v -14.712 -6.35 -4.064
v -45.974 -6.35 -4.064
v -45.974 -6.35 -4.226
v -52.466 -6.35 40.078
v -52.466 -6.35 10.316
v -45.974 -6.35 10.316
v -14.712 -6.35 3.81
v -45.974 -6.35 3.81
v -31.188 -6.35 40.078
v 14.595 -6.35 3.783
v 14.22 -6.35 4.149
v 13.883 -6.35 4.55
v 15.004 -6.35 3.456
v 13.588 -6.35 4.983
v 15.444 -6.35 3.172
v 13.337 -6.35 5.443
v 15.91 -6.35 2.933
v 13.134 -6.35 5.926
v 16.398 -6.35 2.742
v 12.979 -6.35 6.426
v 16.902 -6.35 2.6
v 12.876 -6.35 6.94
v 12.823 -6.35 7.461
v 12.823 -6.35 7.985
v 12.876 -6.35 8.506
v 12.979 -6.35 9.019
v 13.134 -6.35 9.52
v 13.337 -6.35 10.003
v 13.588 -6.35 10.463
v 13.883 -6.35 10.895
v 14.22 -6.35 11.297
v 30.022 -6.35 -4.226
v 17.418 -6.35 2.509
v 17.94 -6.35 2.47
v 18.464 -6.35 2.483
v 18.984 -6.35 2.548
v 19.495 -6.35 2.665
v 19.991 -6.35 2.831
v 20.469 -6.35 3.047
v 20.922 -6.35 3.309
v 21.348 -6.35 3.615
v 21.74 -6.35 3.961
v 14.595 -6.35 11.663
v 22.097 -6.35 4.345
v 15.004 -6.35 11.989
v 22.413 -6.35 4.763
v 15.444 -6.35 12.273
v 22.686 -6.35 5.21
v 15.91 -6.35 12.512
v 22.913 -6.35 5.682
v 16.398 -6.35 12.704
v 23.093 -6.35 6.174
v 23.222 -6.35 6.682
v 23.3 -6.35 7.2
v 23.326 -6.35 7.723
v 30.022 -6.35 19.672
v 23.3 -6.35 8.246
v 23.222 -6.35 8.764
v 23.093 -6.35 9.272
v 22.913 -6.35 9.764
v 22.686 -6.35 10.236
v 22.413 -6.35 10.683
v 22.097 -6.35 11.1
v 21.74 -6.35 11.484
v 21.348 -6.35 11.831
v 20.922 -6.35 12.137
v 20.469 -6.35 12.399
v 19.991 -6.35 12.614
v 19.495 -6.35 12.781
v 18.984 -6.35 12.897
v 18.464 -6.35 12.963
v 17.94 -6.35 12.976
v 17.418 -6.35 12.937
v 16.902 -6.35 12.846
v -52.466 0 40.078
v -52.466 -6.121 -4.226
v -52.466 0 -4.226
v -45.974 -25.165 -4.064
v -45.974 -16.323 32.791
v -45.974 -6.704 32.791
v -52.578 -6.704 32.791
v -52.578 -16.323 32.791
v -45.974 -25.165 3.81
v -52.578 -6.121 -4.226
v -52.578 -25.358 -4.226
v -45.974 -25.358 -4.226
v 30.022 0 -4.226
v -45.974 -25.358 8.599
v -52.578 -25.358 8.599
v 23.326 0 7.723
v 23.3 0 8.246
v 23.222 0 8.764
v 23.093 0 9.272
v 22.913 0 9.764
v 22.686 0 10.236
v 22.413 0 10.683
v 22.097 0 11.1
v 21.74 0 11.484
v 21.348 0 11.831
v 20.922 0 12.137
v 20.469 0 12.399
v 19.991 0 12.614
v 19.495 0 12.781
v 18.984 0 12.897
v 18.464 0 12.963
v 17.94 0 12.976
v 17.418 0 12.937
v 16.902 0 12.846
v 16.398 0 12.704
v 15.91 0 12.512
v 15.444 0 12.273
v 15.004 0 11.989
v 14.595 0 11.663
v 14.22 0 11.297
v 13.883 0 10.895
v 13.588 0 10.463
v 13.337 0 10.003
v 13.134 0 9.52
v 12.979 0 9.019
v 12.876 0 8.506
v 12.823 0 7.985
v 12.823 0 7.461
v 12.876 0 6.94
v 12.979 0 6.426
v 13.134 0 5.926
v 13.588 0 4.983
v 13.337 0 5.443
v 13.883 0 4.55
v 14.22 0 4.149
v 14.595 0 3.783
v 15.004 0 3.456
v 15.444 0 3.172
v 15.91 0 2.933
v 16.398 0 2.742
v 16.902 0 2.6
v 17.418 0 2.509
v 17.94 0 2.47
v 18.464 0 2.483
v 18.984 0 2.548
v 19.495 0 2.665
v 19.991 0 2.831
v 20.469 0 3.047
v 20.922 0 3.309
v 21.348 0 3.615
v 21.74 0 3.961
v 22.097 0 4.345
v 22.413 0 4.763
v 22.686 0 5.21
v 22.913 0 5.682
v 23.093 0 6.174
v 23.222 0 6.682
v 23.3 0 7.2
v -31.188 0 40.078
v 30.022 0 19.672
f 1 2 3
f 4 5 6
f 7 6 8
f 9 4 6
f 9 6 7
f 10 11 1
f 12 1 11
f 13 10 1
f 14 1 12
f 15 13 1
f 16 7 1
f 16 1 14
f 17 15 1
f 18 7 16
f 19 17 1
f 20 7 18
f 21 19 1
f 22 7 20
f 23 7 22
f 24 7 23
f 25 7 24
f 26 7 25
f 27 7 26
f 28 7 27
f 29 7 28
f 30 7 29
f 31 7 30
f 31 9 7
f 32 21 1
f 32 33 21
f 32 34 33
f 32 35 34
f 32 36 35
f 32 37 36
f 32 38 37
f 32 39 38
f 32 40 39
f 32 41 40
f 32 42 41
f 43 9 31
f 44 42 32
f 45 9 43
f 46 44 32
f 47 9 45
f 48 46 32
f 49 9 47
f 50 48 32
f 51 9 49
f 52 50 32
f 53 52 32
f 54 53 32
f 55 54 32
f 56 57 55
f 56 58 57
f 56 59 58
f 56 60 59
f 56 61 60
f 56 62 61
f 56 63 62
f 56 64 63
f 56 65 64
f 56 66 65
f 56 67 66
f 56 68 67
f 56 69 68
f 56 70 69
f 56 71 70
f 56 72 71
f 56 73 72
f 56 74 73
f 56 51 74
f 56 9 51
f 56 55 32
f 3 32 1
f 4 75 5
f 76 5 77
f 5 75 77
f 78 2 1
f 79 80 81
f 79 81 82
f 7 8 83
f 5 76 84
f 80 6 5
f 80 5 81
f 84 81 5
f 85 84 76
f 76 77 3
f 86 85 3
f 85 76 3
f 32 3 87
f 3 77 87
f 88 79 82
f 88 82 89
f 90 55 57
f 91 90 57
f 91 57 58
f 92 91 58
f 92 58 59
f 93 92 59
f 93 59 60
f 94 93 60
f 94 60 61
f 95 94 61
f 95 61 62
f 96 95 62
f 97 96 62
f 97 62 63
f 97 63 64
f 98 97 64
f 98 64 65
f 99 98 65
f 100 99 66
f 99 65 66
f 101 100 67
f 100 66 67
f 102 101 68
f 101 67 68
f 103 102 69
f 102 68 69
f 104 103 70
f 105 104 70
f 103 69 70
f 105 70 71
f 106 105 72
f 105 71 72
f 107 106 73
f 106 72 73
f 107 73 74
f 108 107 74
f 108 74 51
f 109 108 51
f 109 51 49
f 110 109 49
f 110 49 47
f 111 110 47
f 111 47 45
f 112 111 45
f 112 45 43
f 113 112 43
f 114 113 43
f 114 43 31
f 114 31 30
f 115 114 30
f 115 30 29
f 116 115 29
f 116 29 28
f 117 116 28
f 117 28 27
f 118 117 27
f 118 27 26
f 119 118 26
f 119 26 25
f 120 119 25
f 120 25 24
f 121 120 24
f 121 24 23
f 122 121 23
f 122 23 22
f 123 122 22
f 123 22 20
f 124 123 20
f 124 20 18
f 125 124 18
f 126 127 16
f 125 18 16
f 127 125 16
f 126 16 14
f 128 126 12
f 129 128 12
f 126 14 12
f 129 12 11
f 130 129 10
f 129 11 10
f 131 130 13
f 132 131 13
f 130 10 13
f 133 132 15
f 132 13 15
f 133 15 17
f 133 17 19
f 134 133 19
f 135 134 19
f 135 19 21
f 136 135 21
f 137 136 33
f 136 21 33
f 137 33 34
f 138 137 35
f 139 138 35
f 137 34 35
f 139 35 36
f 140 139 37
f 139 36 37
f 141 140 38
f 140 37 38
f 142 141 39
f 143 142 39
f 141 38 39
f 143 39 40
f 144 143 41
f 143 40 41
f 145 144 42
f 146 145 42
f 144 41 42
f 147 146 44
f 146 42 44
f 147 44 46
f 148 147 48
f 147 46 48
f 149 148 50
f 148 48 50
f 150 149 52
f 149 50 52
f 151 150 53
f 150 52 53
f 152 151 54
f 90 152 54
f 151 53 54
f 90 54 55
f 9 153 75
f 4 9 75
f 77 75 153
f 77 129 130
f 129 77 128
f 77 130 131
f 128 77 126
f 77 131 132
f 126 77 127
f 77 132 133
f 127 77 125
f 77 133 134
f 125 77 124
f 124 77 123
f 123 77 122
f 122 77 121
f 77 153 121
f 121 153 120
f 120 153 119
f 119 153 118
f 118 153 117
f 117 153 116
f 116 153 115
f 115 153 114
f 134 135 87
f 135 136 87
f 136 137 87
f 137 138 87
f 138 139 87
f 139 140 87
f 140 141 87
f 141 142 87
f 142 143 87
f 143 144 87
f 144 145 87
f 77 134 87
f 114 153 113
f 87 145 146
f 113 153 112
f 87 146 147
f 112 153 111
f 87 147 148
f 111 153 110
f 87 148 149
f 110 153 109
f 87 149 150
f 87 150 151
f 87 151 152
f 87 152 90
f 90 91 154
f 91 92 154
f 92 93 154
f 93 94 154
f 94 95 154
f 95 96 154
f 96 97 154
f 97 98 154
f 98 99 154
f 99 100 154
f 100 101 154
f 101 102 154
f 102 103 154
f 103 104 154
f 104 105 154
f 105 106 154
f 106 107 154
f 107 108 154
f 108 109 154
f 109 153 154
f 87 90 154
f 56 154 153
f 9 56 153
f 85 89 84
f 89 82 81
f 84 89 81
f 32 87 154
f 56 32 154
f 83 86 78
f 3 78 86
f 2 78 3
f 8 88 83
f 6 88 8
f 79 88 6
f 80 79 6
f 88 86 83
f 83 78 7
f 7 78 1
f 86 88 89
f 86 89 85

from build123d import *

# Parameters (mm, degrees)
F1_DEPTH = 6.35
F3_DEPTH = 52.578
F4_DEPTH = 45.974
F6_DEPTH = 4.064
F7_DEPTH = 3.81
F8_R     = 5.2545700387
F9_DEPTH = 25.4


with BuildPart() as f1:
    # F0 (on Front) → F1 (new body)
    with BuildSketch(Plane.XZ):
        Polygon((-31.1878696084, 40.077868849), (-52.4655729532, 40.077868849), (-52.4655729532, -4.226393532), (30.0219655037, -4.226393532), (30.0219655037, 19.6718552087), align=None)
    extrude(amount=F1_DEPTH)

    # F2 (on Right) → F3 (join)
    with BuildSketch(Plane.YZ):
        Polygon((-6.1209839769, -4.226393532), (-6.7039346322, 32.7909812331), (-16.3226239383, 32.7909812331), (-25.3583602607, 8.5985241458), (-25.3583602607, -4.226393532), align=None)
    extrude(amount=-F3_DEPTH)

    # F4 (cut): a face of the model
    f4_faces = [f1.faces().sort_by_distance(p)[0] for p in [
        (0, -14.7154551351, 12.274399221),
    ]]
    extrude(f4_faces, amount=-F4_DEPTH, mode=Mode.SUBTRACT)

    # F5 (on Top) → F6 (join)
    with BuildSketch(Plane.XY):
        Polygon((-46.0531152785, -6.2667215243), (-46.0531152785, -25.212623179), (-14.5737715065, -6.2667215243), align=None)
    extrude(amount=-F6_DEPTH)

    # F7 (add): a face of the model
    f7_faces = [f1.faces().sort_by_distance(p)[0] for p in [
        (-35.5533806316, -12.6216691671, 0),
    ]]
    extrude(f7_faces, amount=F7_DEPTH)

    # F8 (on face) → F9 (cut)
    with BuildSketch(Plane.XZ.offset(6.35)):
        with Locations((18.0714763701, 7.7227308384)):
            Circle(F8_R)
    extrude(amount=-F9_DEPTH, mode=Mode.SUBTRACT)


solid = f1.part
